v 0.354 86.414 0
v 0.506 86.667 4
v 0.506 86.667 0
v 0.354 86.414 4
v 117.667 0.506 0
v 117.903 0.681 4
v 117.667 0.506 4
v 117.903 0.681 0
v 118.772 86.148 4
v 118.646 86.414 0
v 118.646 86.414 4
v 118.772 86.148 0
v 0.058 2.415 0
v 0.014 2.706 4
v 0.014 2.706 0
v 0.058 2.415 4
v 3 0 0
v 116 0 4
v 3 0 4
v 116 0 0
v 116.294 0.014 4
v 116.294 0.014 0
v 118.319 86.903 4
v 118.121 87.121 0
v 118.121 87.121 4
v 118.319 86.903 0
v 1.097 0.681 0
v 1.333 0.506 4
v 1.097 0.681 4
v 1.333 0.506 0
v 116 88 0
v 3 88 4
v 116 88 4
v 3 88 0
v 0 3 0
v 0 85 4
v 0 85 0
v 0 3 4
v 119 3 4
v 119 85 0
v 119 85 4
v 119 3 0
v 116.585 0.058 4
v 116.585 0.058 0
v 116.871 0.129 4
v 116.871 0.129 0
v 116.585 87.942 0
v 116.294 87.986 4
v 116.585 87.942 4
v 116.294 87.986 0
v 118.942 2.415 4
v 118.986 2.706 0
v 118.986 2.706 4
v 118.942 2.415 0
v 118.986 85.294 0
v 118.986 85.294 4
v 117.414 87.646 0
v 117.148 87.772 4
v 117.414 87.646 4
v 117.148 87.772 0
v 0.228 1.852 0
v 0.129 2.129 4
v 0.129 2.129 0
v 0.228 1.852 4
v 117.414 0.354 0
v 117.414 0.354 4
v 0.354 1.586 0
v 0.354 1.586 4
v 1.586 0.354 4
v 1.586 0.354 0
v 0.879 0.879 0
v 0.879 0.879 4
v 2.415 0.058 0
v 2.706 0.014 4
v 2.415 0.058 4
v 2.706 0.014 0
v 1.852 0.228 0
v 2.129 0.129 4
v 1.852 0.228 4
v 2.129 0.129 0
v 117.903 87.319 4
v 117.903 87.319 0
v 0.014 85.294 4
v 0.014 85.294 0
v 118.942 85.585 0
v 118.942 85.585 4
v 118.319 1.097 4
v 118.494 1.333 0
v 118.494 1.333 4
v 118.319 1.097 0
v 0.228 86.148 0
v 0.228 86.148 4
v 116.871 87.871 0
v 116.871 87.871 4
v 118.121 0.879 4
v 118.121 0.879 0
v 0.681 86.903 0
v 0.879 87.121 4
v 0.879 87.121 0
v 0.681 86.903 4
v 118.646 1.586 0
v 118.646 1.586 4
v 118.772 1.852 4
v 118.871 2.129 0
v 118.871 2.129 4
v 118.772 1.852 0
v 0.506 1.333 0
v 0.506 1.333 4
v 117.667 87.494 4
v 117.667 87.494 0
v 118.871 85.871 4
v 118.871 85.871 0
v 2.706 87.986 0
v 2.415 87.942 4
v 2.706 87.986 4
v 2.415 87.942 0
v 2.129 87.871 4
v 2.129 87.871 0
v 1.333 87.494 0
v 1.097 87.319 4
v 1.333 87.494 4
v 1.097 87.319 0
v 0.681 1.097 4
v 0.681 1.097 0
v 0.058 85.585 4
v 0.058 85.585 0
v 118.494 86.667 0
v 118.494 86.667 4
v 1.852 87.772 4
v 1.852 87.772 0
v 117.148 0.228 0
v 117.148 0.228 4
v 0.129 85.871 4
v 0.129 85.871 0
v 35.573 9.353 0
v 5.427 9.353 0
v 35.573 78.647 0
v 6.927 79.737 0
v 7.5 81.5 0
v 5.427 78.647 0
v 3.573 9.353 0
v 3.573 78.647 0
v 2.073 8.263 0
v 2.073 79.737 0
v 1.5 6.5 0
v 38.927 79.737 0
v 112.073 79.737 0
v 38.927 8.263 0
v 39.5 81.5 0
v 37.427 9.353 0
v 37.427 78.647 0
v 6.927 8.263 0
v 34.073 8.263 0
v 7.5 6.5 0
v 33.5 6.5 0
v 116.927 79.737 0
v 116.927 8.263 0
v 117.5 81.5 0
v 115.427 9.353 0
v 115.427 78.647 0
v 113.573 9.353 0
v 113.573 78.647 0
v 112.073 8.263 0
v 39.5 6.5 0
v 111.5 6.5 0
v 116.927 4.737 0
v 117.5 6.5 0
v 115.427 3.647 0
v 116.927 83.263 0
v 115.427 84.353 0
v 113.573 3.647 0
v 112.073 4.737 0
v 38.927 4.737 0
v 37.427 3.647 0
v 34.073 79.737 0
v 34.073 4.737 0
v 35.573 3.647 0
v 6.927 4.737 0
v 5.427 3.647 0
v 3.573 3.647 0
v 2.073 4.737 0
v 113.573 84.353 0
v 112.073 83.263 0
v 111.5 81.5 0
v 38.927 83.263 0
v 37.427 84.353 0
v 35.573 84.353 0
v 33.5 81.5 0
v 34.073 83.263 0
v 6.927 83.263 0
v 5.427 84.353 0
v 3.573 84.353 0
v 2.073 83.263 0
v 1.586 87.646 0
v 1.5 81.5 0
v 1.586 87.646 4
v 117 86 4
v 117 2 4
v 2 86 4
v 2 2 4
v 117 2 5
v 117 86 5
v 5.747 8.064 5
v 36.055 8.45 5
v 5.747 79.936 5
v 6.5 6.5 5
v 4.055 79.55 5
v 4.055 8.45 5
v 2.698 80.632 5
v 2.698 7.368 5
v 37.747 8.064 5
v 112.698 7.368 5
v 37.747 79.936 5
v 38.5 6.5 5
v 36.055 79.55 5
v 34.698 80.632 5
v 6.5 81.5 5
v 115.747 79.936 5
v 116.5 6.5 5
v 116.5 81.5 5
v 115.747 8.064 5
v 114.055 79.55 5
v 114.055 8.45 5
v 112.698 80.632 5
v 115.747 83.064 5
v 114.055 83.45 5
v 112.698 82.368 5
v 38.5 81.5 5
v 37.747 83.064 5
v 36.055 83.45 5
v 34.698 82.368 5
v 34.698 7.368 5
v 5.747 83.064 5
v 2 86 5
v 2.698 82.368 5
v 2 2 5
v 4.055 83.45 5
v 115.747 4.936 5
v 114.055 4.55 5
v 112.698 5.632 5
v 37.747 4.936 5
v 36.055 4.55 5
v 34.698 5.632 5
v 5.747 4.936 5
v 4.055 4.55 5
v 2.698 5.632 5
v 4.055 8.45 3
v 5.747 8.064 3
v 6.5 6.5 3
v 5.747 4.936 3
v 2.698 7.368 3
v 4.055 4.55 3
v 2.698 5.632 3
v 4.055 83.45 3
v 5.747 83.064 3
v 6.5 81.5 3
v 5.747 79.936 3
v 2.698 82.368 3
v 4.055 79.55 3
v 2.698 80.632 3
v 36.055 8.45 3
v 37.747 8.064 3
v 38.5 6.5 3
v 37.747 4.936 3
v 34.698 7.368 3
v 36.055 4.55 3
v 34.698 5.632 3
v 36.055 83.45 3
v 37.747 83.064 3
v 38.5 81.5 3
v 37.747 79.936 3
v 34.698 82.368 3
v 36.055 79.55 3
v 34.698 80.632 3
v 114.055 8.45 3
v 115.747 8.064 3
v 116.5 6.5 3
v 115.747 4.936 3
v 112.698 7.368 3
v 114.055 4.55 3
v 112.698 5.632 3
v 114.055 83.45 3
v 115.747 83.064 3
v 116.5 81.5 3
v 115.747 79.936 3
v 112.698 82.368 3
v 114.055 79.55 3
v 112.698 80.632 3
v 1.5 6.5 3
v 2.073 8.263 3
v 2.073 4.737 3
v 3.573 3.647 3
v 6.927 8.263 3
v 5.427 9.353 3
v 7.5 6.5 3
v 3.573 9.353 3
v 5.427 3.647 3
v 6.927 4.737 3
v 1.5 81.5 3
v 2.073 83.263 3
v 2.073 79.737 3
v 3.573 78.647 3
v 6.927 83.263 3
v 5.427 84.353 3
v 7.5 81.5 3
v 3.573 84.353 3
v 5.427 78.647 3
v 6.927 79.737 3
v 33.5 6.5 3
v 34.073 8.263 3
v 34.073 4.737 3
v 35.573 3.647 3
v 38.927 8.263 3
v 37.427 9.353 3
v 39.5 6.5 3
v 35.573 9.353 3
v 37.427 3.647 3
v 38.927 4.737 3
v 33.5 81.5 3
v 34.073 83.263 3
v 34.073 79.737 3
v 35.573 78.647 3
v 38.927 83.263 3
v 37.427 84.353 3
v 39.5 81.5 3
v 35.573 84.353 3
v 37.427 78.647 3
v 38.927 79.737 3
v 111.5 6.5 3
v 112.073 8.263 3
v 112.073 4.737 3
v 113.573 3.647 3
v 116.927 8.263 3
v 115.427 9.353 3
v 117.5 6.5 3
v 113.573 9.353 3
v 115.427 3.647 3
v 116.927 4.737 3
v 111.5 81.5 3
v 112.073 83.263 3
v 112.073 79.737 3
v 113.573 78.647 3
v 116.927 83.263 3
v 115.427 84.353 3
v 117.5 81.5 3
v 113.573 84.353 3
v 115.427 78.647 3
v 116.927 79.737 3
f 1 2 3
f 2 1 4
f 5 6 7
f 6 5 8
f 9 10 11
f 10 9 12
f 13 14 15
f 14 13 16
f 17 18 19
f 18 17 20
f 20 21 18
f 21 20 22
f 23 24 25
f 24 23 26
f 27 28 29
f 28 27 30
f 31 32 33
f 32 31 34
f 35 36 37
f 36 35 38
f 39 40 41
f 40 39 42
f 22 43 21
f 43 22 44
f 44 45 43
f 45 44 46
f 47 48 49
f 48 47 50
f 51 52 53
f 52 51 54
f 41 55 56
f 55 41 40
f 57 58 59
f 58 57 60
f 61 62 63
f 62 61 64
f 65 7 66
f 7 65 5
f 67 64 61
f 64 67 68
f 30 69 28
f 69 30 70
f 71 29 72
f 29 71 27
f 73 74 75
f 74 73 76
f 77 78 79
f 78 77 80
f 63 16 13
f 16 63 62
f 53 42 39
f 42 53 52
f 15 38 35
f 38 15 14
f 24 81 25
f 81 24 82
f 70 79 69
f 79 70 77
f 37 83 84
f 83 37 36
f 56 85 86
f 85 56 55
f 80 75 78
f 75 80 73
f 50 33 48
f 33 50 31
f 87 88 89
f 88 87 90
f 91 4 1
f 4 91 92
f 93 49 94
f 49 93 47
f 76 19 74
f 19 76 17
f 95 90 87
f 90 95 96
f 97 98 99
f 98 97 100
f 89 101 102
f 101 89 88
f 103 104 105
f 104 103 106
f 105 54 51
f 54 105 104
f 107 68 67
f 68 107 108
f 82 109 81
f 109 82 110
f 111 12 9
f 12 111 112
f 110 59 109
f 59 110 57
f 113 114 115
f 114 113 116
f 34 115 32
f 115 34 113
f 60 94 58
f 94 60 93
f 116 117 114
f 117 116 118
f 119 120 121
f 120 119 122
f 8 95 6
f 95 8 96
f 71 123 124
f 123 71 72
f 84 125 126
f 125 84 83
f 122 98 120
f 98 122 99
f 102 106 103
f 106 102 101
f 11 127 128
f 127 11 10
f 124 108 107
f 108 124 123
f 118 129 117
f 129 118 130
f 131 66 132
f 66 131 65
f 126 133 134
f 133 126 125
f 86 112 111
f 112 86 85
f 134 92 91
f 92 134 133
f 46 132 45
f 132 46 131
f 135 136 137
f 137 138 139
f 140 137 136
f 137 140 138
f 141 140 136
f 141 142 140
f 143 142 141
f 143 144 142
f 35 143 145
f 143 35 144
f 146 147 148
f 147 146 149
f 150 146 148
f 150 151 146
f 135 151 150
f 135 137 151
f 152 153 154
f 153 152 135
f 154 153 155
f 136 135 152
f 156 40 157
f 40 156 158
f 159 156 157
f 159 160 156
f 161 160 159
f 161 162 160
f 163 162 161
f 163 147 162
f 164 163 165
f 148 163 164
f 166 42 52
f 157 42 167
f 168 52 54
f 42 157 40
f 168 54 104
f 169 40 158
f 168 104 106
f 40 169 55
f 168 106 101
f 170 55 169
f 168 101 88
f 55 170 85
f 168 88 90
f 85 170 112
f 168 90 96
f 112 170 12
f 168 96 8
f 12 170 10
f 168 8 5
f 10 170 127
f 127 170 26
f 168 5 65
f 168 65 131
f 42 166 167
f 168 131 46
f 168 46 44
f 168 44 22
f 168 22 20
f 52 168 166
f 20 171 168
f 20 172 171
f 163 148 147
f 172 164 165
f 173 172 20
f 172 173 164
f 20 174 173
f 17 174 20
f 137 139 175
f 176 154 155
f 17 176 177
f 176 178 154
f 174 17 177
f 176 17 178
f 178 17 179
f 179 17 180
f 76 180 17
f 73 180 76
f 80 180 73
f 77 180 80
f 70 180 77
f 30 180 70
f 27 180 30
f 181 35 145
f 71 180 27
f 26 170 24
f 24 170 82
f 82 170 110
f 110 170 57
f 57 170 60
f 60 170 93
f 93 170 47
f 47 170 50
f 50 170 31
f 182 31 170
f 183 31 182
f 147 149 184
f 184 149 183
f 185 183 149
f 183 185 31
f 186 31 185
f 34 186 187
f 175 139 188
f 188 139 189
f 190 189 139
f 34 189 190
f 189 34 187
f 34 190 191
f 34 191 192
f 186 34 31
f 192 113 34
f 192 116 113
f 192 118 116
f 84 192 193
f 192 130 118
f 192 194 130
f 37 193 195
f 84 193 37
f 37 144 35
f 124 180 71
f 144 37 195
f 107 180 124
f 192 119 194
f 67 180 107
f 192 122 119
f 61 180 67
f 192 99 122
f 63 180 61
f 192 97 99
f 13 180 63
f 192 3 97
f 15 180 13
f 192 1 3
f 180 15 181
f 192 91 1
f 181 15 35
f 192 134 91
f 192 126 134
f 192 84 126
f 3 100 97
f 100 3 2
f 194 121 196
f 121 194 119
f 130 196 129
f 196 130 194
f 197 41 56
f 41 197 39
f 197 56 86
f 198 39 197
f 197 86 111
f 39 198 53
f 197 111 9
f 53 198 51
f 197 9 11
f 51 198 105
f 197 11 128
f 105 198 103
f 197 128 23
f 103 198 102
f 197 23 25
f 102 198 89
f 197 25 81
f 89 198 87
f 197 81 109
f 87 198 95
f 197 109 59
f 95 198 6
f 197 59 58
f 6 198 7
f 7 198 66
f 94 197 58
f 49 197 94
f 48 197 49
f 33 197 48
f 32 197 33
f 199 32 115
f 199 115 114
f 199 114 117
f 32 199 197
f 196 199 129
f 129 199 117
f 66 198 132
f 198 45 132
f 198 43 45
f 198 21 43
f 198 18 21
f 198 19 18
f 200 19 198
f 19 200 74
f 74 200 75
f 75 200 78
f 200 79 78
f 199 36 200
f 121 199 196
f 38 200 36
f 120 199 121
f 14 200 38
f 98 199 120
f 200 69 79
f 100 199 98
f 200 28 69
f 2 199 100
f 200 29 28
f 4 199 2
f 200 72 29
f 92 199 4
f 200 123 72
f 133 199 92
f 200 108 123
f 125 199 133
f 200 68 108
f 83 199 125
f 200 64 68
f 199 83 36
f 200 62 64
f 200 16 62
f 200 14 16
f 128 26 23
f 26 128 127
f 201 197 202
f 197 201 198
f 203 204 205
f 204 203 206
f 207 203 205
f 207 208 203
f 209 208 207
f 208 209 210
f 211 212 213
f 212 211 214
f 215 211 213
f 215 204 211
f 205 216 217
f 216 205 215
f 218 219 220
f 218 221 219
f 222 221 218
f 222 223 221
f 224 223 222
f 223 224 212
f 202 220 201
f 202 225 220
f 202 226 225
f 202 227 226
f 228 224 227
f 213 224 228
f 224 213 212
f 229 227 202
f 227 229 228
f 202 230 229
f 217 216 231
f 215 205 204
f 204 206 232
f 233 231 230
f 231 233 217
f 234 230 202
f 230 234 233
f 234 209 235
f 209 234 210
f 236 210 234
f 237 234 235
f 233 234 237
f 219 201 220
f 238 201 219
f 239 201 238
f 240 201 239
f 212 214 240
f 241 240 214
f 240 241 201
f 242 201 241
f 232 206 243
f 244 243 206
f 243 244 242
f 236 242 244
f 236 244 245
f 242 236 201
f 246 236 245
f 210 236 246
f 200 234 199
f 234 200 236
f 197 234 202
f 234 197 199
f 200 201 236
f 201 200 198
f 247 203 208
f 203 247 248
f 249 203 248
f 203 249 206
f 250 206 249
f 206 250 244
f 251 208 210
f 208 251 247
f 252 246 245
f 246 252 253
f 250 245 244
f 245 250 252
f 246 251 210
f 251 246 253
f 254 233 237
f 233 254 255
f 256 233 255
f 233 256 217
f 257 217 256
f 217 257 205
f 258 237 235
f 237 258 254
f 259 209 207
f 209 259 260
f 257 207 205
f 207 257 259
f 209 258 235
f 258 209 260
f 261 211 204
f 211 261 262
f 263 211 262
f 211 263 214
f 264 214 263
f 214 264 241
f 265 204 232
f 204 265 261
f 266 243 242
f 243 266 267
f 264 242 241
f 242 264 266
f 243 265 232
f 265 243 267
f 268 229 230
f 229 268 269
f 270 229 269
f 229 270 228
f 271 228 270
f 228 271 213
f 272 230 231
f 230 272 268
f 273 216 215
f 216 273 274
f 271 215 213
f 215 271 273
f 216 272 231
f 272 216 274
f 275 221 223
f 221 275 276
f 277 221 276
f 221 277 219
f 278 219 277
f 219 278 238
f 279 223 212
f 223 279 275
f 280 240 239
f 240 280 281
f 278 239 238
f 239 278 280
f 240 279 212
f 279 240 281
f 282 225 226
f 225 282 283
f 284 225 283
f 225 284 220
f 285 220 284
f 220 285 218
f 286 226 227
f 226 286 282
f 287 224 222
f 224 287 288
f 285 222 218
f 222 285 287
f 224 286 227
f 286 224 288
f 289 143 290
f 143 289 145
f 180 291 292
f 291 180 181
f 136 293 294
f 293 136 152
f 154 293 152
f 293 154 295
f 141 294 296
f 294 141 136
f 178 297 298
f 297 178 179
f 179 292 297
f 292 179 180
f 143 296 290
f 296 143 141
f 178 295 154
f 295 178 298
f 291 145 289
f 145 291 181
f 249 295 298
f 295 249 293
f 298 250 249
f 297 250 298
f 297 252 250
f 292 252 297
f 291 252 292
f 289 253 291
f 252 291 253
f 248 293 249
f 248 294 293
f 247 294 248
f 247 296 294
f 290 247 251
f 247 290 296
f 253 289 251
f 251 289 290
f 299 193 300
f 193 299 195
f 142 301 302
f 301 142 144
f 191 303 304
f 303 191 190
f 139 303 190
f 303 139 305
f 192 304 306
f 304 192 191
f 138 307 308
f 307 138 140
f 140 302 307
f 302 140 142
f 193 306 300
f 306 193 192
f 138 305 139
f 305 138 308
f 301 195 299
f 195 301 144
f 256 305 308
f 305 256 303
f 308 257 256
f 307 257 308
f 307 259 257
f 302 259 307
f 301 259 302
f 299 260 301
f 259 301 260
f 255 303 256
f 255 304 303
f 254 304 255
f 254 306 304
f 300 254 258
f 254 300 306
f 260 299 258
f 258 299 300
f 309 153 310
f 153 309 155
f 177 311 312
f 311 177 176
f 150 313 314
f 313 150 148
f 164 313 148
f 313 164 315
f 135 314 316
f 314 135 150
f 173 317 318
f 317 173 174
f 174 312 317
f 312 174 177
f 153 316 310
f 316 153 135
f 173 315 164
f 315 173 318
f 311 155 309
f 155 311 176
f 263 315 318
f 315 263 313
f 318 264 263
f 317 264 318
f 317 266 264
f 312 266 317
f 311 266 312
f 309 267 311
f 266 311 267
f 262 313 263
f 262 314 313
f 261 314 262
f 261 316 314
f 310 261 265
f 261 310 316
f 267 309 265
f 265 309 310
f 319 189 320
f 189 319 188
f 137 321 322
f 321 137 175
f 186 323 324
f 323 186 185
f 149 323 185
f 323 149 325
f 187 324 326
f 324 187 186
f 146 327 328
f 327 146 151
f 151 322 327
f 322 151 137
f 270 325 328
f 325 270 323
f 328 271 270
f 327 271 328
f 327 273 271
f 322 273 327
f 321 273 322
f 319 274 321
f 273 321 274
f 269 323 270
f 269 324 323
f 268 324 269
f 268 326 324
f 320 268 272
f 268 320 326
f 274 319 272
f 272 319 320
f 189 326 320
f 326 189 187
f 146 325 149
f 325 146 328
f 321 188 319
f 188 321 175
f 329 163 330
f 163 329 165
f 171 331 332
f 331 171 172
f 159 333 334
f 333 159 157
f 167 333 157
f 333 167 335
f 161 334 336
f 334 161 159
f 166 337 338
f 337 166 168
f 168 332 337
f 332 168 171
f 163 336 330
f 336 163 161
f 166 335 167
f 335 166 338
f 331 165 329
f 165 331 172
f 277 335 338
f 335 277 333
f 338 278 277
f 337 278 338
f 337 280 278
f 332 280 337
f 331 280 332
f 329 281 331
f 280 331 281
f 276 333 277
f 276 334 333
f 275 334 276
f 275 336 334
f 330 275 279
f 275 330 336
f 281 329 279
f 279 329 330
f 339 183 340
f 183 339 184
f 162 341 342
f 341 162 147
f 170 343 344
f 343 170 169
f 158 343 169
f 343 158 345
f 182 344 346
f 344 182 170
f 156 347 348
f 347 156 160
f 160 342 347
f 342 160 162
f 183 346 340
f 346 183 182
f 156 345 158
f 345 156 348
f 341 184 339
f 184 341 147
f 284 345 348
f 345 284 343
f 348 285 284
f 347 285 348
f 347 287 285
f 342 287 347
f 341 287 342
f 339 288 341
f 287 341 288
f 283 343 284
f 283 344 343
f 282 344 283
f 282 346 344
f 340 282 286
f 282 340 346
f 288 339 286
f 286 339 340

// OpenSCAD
difference() {
    union() {
        // Back:
        roundedcube(119, 88, 4, 3);
        // Lip:
        translate([2, 2, 2])
            cube([115, 84, 3]);
    }

    // Screw holes:
    translate([4.5, 6.5, -1])
        cylinder(h=7, r=2);
    translate([4.5, 81.5, -1])
        cylinder(h=7, r=2);
    translate([36.5, 6.5, -1])
        cylinder(h=7, r=2);
    translate([36.5, 81.5, -1])
        cylinder(h=7, r=2);        
    translate([114.5, 6.5, -1])
        cylinder(h=7, r=2);
    translate([114.5, 81.5, -1])
        cylinder(h=7, r=2);
    
    // Sinks for nuts:
    translate([4.5, 6.5, -1])
        cylinder(h=4, r=3);
    translate([4.5, 81.5, -1])
        cylinder(h=4, r=3);
    translate([36.5, 6.5, -1])
        cylinder(h=4, r=3);
    translate([36.5, 81.5, -1])
        cylinder(h=4, r=3);        
    translate([114.5, 6.5, -1])
        cylinder(h=4, r=3);
    translate([114.5, 81.5, -1])
        cylinder(h=4, r=3);
    
}

module roundedcube(xdim, ydim, zdim, rdim) {
    $fn=64;
    hull() {
        translate([rdim, rdim, 0])
            cylinder(r=rdim, h=zdim);
        translate([xdim-rdim, rdim, 0])
            cylinder(r=rdim, h=zdim);
        translate([rdim, ydim-rdim, 0])
            cylinder(r=rdim, h=zdim);
        translate([xdim-rdim, ydim-rdim, 0])
            cylinder(r=rdim, h=zdim);
    }
}
